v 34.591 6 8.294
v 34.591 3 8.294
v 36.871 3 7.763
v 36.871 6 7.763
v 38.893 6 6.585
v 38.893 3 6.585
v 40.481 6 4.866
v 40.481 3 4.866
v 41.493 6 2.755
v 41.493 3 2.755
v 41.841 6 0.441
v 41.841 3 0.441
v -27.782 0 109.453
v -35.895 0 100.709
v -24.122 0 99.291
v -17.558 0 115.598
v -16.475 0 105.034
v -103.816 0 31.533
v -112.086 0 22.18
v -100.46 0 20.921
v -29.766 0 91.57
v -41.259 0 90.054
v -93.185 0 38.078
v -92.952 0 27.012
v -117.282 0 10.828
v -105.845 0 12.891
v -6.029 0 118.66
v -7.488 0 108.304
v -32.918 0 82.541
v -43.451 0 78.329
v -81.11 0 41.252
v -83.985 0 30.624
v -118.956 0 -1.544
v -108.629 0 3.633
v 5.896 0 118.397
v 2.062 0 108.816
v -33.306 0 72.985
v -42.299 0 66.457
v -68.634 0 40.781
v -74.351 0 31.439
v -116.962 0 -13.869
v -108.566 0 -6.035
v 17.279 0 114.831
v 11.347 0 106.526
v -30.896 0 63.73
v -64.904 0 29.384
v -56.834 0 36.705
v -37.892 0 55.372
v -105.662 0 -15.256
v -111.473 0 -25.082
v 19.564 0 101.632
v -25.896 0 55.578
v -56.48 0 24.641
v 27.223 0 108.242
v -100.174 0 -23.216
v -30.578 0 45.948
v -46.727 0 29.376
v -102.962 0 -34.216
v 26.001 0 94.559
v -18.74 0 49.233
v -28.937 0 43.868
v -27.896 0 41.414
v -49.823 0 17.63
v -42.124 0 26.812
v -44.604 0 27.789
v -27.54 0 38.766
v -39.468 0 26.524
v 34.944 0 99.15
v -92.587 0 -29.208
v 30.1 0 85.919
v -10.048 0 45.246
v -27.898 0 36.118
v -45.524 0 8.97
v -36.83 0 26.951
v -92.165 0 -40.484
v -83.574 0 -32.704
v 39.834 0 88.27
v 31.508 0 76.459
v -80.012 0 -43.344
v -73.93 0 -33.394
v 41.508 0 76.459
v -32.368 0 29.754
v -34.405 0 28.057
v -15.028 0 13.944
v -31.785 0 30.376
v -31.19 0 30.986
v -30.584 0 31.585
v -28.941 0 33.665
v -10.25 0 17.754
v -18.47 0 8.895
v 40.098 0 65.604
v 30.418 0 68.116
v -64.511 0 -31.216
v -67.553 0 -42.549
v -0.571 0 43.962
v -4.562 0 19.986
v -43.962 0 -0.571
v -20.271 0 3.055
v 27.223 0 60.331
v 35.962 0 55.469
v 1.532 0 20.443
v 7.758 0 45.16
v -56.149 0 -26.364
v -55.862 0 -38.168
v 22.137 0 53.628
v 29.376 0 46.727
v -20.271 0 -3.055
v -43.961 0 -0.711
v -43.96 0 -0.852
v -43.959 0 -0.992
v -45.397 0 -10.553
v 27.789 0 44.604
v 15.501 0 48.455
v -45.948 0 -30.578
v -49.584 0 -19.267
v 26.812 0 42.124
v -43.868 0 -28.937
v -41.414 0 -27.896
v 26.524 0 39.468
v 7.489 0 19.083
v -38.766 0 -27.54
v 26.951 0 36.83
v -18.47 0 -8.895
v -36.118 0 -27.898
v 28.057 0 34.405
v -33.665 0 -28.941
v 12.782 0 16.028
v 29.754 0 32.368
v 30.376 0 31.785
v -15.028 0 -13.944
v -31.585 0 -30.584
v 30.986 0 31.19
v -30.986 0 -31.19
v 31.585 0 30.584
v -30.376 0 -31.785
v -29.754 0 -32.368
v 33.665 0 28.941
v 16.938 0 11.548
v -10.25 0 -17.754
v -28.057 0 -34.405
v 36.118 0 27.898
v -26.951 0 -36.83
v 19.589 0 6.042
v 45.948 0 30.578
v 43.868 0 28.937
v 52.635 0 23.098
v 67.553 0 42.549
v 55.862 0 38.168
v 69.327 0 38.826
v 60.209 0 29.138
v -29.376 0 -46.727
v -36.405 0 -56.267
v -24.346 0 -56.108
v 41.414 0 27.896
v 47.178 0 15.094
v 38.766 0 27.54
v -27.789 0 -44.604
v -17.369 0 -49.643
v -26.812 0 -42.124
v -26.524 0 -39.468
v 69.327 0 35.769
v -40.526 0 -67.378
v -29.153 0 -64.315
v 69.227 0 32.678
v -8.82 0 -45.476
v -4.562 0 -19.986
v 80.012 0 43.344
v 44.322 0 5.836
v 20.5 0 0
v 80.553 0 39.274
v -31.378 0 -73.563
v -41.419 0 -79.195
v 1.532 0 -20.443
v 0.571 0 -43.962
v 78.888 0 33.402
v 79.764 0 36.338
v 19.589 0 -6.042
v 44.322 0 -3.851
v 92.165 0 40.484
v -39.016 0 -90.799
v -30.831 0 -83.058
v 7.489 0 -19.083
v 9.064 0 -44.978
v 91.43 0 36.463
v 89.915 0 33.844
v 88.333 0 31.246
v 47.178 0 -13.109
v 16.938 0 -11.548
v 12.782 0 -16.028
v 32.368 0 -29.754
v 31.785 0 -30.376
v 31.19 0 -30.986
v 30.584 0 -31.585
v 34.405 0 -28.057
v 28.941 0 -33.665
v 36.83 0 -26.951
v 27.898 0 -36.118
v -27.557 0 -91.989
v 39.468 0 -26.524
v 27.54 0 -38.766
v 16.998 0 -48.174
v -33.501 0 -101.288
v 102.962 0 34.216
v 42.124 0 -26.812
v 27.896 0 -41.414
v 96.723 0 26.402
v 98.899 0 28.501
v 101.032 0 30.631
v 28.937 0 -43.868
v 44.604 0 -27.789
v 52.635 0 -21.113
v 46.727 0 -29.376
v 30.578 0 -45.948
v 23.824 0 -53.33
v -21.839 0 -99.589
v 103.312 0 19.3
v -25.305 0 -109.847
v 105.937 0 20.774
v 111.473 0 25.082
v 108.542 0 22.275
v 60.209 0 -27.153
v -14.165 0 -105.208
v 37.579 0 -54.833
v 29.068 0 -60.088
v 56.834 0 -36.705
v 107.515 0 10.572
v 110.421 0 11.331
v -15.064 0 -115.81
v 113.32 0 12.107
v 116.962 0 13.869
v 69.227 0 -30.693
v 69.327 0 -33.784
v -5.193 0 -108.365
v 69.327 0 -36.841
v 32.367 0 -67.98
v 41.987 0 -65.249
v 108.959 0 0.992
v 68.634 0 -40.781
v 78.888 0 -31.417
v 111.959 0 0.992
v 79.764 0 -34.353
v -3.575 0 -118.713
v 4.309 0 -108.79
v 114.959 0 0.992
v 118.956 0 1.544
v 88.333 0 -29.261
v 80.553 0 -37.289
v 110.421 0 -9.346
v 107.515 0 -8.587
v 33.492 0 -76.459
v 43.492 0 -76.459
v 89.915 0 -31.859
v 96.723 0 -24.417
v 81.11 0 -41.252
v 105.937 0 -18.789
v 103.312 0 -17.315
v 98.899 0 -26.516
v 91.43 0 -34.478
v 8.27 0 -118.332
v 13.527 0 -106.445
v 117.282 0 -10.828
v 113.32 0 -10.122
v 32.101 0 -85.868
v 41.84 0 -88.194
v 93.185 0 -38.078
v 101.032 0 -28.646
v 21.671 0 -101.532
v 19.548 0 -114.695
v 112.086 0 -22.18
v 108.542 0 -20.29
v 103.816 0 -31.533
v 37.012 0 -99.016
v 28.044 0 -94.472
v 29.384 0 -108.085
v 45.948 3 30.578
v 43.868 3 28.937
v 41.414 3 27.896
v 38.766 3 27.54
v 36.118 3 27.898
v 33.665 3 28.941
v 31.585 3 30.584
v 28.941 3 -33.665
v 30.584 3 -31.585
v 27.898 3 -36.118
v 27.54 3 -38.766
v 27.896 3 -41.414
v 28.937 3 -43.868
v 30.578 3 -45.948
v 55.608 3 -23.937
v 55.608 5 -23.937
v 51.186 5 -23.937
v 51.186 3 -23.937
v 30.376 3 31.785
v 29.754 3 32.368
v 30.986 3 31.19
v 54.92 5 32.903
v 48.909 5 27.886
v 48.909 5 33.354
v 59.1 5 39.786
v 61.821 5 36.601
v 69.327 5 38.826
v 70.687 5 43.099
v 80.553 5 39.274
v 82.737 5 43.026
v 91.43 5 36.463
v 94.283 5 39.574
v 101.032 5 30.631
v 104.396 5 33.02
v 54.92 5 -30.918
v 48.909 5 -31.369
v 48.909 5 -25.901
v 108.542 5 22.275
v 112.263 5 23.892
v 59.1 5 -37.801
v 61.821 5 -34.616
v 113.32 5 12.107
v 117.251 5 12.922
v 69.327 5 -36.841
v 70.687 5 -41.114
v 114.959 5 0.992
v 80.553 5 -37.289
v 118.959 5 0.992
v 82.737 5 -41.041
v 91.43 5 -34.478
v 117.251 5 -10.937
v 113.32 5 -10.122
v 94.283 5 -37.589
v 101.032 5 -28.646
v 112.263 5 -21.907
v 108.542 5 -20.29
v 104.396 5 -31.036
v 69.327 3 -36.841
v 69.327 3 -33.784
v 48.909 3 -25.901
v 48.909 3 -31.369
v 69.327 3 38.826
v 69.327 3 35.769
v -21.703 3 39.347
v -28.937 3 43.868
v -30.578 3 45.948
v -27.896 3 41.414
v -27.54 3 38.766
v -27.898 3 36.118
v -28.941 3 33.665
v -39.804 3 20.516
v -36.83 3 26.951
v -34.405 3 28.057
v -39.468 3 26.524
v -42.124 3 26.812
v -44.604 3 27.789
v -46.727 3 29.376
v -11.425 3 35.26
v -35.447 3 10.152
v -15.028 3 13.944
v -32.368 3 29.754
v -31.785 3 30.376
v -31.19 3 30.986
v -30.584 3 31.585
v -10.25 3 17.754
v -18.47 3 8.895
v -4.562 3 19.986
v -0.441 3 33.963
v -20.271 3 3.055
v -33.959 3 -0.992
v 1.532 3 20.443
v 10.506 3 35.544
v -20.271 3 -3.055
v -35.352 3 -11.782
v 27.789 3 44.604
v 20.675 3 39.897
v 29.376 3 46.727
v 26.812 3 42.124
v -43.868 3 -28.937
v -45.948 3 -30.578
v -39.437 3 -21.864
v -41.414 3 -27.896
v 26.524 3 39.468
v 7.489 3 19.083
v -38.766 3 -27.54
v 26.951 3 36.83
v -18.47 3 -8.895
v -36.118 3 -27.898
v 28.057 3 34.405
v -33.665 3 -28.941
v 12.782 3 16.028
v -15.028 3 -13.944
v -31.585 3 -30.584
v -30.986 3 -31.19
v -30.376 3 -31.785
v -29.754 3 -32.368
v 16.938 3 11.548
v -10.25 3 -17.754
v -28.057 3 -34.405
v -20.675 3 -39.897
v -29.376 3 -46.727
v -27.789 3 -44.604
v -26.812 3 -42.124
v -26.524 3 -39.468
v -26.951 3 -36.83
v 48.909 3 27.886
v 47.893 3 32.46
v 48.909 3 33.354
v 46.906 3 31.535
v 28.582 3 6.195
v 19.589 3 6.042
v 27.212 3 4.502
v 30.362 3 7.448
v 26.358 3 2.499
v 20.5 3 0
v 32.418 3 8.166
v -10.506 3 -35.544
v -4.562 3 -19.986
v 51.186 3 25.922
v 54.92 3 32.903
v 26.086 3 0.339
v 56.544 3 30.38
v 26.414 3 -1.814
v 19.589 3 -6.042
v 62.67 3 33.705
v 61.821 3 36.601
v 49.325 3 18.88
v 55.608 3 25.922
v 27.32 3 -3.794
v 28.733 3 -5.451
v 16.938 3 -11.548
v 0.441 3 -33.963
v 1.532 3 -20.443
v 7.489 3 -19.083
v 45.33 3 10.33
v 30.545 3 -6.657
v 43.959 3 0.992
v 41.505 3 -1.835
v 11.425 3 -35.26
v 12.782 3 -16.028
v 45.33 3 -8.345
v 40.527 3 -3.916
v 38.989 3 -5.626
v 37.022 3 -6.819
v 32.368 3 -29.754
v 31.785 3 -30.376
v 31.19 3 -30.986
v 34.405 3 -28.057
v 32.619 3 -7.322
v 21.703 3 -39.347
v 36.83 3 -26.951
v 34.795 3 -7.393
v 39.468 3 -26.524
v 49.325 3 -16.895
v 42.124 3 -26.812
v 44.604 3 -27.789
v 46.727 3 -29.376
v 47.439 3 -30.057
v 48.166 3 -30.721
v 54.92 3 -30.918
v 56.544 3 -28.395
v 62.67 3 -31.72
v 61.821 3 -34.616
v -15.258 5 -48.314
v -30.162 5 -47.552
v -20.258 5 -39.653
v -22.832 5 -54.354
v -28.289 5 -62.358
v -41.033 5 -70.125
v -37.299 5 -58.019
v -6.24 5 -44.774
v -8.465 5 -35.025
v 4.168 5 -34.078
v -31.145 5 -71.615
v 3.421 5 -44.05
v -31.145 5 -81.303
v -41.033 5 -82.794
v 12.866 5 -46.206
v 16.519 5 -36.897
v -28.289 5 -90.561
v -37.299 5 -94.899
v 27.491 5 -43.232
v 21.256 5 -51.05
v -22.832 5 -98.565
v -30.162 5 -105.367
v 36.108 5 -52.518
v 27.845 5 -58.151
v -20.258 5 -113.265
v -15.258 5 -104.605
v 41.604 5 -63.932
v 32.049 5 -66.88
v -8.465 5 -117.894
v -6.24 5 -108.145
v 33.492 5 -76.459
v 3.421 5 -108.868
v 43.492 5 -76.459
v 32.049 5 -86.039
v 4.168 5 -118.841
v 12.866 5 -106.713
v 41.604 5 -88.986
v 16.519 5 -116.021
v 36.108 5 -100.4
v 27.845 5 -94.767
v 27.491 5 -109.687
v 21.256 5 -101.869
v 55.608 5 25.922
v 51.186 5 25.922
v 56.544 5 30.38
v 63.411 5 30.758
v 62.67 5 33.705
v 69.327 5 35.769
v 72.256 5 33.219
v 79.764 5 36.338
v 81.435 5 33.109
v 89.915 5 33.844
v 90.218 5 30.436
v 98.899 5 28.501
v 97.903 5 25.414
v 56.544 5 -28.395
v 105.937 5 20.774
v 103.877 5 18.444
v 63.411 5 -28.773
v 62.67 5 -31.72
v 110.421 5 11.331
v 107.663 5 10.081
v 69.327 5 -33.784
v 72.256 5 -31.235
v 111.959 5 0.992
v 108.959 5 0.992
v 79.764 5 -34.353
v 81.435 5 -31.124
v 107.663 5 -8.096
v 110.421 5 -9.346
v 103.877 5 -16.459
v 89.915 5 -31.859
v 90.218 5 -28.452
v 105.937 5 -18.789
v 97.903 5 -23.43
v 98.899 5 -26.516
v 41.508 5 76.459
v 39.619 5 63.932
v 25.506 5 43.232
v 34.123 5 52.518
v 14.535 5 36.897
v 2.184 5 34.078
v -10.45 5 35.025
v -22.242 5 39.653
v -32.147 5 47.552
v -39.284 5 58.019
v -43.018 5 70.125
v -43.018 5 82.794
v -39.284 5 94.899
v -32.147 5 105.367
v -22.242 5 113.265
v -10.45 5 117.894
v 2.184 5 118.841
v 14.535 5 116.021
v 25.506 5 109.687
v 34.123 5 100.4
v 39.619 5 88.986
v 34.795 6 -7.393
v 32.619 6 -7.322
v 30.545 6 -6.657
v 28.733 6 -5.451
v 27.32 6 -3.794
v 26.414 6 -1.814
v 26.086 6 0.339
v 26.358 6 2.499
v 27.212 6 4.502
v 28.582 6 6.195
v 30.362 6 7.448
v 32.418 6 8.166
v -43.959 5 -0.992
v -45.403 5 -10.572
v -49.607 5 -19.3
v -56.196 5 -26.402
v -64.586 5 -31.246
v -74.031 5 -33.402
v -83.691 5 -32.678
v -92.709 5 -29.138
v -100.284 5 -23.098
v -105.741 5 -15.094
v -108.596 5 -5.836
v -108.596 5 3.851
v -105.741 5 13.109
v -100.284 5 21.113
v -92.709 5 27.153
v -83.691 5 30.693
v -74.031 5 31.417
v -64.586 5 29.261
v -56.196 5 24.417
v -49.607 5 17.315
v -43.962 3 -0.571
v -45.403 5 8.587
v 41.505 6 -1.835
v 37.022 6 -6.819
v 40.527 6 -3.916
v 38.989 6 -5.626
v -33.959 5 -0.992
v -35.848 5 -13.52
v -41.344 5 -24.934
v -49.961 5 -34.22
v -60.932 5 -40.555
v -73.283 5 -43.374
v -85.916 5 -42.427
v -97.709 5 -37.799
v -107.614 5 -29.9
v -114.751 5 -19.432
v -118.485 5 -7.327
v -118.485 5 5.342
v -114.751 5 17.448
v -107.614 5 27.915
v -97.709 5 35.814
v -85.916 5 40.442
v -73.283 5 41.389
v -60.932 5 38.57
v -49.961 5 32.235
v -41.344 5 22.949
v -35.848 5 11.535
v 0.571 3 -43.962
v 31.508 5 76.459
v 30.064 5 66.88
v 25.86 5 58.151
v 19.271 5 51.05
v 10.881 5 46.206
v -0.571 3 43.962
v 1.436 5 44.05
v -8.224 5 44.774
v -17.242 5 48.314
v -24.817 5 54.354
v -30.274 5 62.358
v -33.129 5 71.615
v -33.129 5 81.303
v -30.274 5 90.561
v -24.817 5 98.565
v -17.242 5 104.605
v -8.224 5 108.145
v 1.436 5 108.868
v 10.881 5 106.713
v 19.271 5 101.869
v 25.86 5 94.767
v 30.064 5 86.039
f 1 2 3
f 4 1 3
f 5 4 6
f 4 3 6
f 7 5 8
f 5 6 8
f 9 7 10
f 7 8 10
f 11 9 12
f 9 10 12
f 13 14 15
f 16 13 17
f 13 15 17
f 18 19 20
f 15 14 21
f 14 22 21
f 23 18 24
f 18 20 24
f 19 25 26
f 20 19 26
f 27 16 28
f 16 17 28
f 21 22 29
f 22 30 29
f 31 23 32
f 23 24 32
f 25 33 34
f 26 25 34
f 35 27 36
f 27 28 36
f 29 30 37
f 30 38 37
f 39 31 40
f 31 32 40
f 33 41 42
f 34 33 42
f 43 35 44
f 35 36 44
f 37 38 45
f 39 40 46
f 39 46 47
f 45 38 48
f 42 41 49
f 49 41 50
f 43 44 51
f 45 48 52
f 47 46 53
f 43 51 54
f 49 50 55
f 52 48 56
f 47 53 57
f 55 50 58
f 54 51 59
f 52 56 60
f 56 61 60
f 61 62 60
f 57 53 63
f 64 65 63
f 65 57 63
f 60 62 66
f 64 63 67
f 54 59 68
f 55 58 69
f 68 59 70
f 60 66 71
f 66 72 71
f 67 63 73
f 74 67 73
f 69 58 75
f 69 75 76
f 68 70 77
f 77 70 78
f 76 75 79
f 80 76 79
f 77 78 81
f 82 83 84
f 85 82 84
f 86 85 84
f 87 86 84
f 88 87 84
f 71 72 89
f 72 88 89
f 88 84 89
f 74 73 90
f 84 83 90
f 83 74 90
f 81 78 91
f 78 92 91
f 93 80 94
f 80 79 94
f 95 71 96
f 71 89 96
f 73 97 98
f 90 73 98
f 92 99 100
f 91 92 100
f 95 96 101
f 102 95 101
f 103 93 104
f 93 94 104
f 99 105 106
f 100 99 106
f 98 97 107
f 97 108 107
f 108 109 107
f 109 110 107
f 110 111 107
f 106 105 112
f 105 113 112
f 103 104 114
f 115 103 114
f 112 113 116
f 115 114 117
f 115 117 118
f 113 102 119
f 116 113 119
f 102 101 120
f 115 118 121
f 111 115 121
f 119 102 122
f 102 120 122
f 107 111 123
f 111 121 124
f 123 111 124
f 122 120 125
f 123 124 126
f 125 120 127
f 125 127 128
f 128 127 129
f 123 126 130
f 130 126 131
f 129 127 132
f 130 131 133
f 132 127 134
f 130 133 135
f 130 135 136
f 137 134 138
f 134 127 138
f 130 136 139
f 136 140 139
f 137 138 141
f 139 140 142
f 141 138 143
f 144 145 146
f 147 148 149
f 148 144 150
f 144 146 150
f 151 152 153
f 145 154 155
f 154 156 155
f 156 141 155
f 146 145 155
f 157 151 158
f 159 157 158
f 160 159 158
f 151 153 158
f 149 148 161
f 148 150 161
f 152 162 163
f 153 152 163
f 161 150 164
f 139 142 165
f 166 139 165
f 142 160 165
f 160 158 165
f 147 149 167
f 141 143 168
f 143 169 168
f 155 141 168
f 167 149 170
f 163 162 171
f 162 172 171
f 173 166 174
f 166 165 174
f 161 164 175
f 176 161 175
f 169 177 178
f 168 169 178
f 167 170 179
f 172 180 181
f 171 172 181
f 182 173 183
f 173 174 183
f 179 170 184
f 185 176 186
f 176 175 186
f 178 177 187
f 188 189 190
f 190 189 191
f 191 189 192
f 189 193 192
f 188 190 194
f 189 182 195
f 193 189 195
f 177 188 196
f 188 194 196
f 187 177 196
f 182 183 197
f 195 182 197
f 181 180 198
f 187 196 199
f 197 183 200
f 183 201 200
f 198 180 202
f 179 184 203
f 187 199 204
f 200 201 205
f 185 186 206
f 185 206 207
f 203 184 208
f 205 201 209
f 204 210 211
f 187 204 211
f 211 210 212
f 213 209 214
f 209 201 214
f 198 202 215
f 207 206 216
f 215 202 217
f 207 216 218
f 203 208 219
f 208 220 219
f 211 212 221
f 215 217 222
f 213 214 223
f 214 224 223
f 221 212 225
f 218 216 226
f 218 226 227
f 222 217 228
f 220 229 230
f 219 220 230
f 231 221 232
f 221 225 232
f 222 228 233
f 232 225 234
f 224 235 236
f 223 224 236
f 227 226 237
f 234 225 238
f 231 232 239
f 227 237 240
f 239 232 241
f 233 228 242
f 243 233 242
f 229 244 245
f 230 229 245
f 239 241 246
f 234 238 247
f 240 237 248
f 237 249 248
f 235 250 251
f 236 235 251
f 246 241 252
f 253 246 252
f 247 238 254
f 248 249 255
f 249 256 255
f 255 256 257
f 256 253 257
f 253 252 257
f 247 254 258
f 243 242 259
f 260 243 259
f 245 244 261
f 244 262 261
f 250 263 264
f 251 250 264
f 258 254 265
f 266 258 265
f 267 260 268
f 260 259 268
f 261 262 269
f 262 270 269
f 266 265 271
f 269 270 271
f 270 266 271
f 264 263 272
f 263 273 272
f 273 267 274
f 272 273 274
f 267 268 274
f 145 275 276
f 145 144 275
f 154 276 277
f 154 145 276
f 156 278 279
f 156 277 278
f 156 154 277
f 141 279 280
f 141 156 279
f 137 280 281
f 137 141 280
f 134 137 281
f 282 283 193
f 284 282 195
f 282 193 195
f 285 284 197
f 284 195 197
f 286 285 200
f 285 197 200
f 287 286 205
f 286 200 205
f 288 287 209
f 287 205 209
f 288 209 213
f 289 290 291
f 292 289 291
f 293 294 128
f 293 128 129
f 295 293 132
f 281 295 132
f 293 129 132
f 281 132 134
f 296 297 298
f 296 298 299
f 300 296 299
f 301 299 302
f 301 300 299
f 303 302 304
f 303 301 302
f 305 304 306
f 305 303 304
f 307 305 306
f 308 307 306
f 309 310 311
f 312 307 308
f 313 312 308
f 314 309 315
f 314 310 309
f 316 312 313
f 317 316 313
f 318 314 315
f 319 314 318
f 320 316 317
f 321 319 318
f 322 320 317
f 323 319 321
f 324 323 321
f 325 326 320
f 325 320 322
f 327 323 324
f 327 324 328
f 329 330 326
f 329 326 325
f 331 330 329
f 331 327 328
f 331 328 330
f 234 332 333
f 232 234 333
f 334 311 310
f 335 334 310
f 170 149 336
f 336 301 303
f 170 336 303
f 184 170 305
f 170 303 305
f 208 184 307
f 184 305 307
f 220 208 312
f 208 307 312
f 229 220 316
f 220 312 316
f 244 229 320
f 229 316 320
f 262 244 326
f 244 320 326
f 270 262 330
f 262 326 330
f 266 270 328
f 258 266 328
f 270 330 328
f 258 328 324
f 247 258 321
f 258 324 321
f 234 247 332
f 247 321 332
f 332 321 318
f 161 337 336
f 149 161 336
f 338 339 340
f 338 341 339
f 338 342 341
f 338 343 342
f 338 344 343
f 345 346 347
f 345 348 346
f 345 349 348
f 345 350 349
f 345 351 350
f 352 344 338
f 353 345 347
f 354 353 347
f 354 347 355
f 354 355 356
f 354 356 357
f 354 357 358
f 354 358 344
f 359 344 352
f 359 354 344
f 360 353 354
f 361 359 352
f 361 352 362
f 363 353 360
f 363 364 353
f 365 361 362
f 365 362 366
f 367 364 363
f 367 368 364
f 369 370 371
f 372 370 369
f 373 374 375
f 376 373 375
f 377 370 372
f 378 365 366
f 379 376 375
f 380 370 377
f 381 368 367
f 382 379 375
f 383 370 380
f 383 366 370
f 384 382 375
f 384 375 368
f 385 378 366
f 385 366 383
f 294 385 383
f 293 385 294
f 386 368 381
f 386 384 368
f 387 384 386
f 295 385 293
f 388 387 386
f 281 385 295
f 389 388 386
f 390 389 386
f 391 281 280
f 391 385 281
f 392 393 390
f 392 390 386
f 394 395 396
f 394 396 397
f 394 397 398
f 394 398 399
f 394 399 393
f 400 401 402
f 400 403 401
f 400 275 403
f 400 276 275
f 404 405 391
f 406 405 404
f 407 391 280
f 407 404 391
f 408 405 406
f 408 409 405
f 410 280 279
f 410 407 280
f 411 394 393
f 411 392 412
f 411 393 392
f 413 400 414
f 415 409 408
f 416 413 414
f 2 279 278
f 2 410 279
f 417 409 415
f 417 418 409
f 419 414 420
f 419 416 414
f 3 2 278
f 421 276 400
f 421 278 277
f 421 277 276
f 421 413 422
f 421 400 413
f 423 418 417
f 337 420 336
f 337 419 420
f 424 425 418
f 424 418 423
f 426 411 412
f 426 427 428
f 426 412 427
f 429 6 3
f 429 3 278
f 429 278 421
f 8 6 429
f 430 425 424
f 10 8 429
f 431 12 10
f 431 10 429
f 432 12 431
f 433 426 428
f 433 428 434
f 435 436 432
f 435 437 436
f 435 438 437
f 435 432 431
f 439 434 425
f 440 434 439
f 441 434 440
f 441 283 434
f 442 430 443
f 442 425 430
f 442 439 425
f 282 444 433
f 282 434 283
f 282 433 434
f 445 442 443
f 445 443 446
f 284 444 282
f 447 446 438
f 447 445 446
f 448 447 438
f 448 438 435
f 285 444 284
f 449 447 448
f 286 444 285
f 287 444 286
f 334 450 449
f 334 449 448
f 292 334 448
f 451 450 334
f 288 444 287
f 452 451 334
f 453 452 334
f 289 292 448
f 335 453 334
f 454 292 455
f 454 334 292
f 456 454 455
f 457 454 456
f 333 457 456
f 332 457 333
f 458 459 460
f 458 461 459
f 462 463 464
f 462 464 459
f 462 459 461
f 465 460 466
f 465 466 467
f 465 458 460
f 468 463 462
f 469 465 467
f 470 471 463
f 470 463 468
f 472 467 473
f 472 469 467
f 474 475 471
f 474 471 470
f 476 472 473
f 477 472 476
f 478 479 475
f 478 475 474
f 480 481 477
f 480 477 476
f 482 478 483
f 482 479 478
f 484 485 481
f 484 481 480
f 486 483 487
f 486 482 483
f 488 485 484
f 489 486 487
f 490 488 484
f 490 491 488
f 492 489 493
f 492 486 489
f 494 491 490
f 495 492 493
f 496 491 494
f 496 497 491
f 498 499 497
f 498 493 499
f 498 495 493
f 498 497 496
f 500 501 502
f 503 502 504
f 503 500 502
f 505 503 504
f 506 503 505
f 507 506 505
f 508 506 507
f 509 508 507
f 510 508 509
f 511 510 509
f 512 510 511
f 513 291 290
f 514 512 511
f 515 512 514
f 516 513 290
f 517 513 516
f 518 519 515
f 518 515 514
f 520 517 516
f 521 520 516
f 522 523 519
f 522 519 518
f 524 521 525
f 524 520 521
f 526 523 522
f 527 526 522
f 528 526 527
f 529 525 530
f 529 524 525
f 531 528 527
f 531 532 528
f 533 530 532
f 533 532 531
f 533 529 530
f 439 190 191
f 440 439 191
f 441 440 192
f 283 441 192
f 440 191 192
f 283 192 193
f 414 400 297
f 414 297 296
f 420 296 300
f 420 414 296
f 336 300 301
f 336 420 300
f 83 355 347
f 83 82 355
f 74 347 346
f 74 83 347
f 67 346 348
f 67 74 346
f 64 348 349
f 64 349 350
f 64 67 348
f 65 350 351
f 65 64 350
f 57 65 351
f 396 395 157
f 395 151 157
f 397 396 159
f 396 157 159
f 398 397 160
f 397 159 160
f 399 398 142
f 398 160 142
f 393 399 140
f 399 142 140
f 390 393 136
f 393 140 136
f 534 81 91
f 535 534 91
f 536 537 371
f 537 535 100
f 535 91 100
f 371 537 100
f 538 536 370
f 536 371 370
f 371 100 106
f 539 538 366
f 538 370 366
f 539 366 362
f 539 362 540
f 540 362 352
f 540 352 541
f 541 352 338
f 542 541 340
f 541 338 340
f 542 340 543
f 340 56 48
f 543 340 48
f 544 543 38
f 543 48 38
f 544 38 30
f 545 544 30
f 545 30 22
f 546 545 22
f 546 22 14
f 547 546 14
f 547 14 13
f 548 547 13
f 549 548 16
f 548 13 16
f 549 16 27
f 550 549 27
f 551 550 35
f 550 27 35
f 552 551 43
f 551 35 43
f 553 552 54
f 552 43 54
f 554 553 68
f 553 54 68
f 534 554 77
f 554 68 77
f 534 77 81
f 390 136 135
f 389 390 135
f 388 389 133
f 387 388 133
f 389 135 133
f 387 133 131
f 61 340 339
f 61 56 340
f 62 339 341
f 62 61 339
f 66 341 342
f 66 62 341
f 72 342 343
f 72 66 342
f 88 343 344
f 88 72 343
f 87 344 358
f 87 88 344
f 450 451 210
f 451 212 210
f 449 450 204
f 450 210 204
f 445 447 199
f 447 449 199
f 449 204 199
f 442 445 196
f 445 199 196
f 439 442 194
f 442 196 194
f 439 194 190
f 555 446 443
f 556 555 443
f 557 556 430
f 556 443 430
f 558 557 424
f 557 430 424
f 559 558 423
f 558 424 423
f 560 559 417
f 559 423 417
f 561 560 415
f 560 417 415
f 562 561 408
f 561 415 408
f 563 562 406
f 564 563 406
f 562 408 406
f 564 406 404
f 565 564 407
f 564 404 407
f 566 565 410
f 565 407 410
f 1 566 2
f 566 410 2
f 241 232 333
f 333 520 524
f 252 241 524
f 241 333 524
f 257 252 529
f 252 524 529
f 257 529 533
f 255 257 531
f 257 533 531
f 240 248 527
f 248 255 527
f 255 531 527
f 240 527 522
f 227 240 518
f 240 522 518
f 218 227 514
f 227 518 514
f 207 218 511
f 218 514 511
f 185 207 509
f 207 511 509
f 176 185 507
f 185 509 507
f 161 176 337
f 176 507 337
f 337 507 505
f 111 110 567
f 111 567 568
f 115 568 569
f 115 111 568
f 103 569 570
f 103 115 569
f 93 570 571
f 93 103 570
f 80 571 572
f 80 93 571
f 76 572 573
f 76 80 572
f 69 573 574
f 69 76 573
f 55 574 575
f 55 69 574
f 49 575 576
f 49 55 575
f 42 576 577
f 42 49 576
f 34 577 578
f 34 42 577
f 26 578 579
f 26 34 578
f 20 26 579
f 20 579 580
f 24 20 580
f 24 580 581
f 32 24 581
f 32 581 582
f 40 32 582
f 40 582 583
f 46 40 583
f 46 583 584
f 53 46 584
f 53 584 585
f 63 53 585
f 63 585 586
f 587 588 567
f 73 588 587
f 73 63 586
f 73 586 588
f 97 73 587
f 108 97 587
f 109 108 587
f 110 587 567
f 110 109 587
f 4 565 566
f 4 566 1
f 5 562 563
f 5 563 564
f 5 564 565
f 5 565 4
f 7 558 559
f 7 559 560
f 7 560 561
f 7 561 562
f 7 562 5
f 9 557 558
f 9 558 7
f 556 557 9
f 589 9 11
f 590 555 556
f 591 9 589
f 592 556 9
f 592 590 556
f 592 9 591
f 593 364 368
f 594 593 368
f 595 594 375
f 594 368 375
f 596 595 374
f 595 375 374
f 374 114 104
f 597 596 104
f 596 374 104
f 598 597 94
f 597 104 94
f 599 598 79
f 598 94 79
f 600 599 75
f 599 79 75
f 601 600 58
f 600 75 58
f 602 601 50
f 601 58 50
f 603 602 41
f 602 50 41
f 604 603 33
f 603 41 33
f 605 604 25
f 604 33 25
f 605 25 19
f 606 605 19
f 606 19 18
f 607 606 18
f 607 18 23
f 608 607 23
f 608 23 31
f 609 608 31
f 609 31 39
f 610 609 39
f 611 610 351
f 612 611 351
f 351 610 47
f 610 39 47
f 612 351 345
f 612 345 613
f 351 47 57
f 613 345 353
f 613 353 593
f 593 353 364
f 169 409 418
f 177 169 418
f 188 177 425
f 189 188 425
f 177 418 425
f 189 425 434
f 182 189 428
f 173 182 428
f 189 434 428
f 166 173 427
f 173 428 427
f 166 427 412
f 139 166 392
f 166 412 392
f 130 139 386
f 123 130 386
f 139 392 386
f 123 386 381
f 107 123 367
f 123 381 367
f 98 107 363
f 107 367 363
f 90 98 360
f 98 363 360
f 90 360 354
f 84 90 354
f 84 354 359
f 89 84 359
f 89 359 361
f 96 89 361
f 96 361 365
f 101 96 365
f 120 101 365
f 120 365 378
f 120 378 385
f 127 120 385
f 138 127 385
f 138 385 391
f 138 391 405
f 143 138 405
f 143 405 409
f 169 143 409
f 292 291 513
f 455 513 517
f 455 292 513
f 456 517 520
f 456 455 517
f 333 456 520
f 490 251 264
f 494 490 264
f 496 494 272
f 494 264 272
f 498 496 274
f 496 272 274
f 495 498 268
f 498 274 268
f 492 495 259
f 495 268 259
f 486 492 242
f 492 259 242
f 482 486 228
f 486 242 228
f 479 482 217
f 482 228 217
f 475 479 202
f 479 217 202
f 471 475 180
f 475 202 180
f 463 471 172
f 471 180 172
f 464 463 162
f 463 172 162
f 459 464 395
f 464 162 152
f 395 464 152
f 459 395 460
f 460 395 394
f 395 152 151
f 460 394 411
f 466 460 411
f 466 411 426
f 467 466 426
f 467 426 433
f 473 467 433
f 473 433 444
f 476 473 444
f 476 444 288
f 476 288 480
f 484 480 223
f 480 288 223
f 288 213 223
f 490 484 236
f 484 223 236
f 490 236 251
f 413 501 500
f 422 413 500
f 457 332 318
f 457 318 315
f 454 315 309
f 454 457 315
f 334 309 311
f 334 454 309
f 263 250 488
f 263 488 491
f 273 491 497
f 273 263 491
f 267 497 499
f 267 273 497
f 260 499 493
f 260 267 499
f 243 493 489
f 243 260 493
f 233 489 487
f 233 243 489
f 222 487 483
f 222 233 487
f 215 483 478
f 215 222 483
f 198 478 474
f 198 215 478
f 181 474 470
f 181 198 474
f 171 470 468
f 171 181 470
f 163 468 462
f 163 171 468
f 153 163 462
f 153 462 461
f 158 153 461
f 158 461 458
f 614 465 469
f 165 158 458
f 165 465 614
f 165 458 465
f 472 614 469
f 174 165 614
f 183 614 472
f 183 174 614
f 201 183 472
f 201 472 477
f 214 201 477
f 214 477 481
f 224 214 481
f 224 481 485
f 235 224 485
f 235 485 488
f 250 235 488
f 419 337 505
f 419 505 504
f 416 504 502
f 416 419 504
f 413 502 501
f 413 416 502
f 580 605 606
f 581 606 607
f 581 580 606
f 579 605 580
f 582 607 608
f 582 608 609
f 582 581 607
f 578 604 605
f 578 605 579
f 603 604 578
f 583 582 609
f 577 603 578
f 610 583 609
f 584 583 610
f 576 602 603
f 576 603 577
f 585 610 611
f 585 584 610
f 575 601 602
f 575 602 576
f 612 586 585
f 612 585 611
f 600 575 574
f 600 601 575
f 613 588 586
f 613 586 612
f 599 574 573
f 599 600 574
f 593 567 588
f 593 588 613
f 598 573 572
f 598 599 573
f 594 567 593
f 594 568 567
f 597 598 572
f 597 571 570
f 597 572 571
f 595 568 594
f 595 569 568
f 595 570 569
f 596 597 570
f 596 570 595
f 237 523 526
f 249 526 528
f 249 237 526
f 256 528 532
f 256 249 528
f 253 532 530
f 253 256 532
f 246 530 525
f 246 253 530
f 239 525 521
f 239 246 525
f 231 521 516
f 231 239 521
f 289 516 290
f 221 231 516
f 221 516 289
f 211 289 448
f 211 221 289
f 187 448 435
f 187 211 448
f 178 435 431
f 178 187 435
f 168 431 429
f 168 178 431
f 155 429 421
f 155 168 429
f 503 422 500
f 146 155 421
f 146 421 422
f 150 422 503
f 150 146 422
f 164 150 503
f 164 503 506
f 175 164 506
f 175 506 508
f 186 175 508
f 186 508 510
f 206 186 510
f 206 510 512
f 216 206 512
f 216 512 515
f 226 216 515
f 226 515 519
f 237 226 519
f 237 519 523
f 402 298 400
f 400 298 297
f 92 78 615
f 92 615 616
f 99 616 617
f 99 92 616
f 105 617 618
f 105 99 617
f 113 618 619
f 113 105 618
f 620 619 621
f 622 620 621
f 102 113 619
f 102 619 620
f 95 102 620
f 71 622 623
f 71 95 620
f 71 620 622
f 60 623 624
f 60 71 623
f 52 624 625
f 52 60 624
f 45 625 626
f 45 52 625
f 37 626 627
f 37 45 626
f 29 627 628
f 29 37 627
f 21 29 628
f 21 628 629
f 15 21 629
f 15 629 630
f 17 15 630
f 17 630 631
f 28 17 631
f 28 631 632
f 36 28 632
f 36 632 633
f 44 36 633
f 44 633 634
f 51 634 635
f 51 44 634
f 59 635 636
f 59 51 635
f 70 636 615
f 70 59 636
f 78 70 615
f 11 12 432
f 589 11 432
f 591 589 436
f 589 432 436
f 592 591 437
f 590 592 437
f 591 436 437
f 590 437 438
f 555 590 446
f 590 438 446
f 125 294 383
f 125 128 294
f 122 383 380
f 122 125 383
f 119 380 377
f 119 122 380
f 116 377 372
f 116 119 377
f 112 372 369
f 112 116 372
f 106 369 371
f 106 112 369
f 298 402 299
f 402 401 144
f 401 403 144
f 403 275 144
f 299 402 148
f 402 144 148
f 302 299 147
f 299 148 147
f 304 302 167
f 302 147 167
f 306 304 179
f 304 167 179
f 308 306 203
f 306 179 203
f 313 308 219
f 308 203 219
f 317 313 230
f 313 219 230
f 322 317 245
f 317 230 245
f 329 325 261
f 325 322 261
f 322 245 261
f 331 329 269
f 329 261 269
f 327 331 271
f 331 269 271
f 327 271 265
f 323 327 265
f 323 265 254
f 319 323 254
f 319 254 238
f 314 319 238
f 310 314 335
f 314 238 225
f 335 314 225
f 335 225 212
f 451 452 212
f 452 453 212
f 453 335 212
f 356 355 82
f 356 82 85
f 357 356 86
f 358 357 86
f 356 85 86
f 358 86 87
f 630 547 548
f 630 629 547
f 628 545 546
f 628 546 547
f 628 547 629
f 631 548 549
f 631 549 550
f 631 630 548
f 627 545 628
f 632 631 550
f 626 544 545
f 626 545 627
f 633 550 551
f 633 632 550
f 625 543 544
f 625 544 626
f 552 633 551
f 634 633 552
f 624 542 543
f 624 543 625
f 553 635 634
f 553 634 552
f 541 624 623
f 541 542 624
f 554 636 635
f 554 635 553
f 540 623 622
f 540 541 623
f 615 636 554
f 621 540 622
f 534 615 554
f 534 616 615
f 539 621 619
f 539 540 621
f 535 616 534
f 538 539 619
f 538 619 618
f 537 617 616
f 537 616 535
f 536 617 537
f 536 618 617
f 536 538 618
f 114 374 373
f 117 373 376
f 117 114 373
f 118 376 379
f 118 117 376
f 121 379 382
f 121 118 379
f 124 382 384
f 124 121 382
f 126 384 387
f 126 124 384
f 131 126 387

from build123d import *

# Parameters (mm, degrees)
IZIM1_R                     = 43.965787967
Y_KSEKLIK_EKSTR_ZYON1_DEPTH = 3
IZIM1_3_R                   = 42.5
IZIM1_3_R_2                 = 32.5
EKSTR_ZYON_NCE1_DEPTH       = 5
RADYUS1_R                   = 10
KES_EKSTR_ZYON1_DEPTH       = 3.0000001
KES_EKSTR_ZYON1_DEPTH_BACK  = 4.0000001
KES_EKSTR_ZYON2_DEPTH       = 2
KES_EKSTR_ZYON3_DEPTH       = 3.0000001
IZIM6_R                     = 20.5
KES_EKSTR_ZYON4_DEPTH       = 4.0000001
Y_KSEKLIK_EKSTR_ZYON4_DEPTH = 3


with BuildPart() as part:
    # Çizim1 → Yükseklik-Ekstrüzyon1 (new body)
    with BuildSketch(Plane(origin=(0, 0, 0), x_dir=(1, 0, 0), z_dir=(0, 1, 0))):
        Circle(IZIM1_R)
    extrude(amount=Y_KSEKLIK_EKSTR_ZYON1_DEPTH)

    # Çizim1<3> → Ekstrüzyon-İnce1 (add)
    with BuildSketch(Plane(origin=(0, 0, 0), x_dir=(1, 0, 0), z_dir=(0, 1, 0))):
        with Locations((76.459347515, -0.992424829)):
            Circle(IZIM1_3_R)
        with Locations((76.459347515, -0.992424829)):
            Circle(IZIM1_3_R_2, mode=Mode.SUBTRACT)
        with Locations((-0.992424829, -76.459347515)):
            Circle(IZIM1_3_R)
        with Locations((-0.992424829, -76.459347515)):
            Circle(IZIM1_3_R_2, mode=Mode.SUBTRACT)
        with Locations((-76.459347515, 0.992424829)):
            Circle(IZIM1_3_R)
        with Locations((-76.459347515, 0.992424829)):
            Circle(IZIM1_3_R_2, mode=Mode.SUBTRACT)
        with Locations((0.992424829, 76.459347515)):
            Circle(IZIM1_3_R)
        with Locations((0.992424829, 76.459347515)):
            Circle(IZIM1_3_R_2, mode=Mode.SUBTRACT)
    extrude(amount=EKSTR_ZYON_NCE1_DEPTH)

    # Radyus1
    radyus1_edges = [part.edges().sort_by_distance(p)[0] for p in [
        (-20.683952175, 1.5, 38.796451307),
        (19.670015447, 1.5, 39.320236569),
        (38.796451307, 1.5, 20.683952175),
        (39.320236569, 1.5, -19.670015447),
        (20.683952175, 1.5, -38.796451307),
        (-19.670015447, 1.5, -39.320236569),
        (-38.796451307, 1.5, -20.683952175),
        (-39.320236569, 1.5, 19.670015447),
    ]]
    fillet(radyus1_edges, radius=RADYUS1_R)

    # Çizim3 → Kes-Ekstrüzyon1 (cut, two sides)
    with BuildSketch(Plane(origin=(0, 3, 0), x_dir=(1, 0, 0), z_dir=(0, 1, 0))) as kes_ekstr_zyon1_sk:
        with BuildLine():
            Line((69.327141955, 36.841179861), (69.327141955, 33.783740052))
            ThreePointArc((69.327141955, 33.783740052), (111.959347515, -0.992424829), (69.327141955, -35.76858971))
            Line((69.327141955, -35.76858971), (69.327141955, -38.826029519))
            ThreePointArc((69.327141955, -38.826029519), (114.959347515, -0.992424829), (69.327141955, 36.841179861))
        make_face()
    extrude(amount=KES_EKSTR_ZYON1_DEPTH, mode=Mode.SUBTRACT)
    extrude(kes_ekstr_zyon1_sk.sketch, amount=-KES_EKSTR_ZYON1_DEPTH_BACK, mode=Mode.SUBTRACT)

    # Çizim4 → Kes-Ekstrüzyon2 (cut)
    with BuildSketch(Plane(origin=(0, 5, 0), x_dir=(1, 0, 0), z_dir=(0, 1, 0))):
        Polygon((48.909390592, -25.92206781), (55.608378692, -25.92206781), (55.608378692, 23.937218152), (48.909390592, 23.937218152), (48.909390592, 40.294217079), (36.28293528, 40.294217079), (36.28293528, 23.937218152), (27.96095337, 23.937218152), (27.96095337, -25.92206781), (36.28293528, -25.92206781), (36.28293528, -39.195058406), (48.909390592, -39.195058406), align=None)
    extrude(amount=-KES_EKSTR_ZYON2_DEPTH, mode=Mode.SUBTRACT)

    # Çizim3<4> → Kes-Ekstrüzyon3 (cut, through all)
    with BuildSketch(Plane(origin=(0, 3, 0), x_dir=(1, 0, 0), z_dir=(0, 1, 0))):
        with BuildLine():
            ThreePointArc((47.215527353, -26.033370944), (57.179387966, -34.317087765), (69.327141955, -38.826029519))
            Line((69.327141955, -38.826029519), (69.327141955, -35.76858971))
            ThreePointArc((69.327141955, -35.76858971), (58.437150617, -31.577558783), (49.494266586, -24.08212839))
            Line((49.494266586, -24.08212839), (47.215527353, -26.033370944))
        make_face()
        with BuildLine():
            Line((69.327141955, 33.783740052), (69.327141955, 36.841179861))
            ThreePointArc((69.327141955, 36.841179861), (57.316539714, 32.411211343), (47.42238732, 24.288100138))
            Line((47.42238732, 24.288100138), (49.685007595, 22.318189102))
            ThreePointArc((49.685007595, 22.318189102), (58.563030261, 29.666535179), (69.327141955, 33.783740052))
        make_face()
    extrude(amount=KES_EKSTR_ZYON3_DEPTH, mode=Mode.SUBTRACT)

    # Çizim6 → Kes-Ekstrüzyon4 (cut, through all)
    with BuildSketch(Plane(origin=(0, 3, 0), x_dir=(1, 0, 0), z_dir=(0, 1, 0))):
        Circle(IZIM6_R)
    extrude(amount=-KES_EKSTR_ZYON4_DEPTH, mode=Mode.SUBTRACT)

    # Çizim3<6> → Yükseklik-Ekstrüzyon4 (add)
    with BuildSketch(Plane(origin=(0, 3, 0), x_dir=(1, 0, 0), z_dir=(0, 1, 0))):
        with BuildLine():
            ThreePointArc((34.591220847, -8.293792461), (39.7514282, -5.784707132), (41.840982512, -0.44083102))
            ThreePointArc((41.840982512, -0.44083102), (39.820297101, 4.827467905), (34.794834124, 7.39317735))
            ThreePointArc((34.794834124, 7.39317735), (33.962927145, -0.44083102), (34.591220847, -8.293792461))
        make_face()
        with BuildLine():
            ThreePointArc((34.591220847, -8.293792461), (33.962927145, -0.44083102), (34.794834124, 7.39317735))
            ThreePointArc((34.794834124, 7.39317735), (26.08553532, -0.338584277), (34.591220847, -8.293792461))
        make_face()
    extrude(amount=Y_KSEKLIK_EKSTR_ZYON4_DEPTH)


solid = part.part
